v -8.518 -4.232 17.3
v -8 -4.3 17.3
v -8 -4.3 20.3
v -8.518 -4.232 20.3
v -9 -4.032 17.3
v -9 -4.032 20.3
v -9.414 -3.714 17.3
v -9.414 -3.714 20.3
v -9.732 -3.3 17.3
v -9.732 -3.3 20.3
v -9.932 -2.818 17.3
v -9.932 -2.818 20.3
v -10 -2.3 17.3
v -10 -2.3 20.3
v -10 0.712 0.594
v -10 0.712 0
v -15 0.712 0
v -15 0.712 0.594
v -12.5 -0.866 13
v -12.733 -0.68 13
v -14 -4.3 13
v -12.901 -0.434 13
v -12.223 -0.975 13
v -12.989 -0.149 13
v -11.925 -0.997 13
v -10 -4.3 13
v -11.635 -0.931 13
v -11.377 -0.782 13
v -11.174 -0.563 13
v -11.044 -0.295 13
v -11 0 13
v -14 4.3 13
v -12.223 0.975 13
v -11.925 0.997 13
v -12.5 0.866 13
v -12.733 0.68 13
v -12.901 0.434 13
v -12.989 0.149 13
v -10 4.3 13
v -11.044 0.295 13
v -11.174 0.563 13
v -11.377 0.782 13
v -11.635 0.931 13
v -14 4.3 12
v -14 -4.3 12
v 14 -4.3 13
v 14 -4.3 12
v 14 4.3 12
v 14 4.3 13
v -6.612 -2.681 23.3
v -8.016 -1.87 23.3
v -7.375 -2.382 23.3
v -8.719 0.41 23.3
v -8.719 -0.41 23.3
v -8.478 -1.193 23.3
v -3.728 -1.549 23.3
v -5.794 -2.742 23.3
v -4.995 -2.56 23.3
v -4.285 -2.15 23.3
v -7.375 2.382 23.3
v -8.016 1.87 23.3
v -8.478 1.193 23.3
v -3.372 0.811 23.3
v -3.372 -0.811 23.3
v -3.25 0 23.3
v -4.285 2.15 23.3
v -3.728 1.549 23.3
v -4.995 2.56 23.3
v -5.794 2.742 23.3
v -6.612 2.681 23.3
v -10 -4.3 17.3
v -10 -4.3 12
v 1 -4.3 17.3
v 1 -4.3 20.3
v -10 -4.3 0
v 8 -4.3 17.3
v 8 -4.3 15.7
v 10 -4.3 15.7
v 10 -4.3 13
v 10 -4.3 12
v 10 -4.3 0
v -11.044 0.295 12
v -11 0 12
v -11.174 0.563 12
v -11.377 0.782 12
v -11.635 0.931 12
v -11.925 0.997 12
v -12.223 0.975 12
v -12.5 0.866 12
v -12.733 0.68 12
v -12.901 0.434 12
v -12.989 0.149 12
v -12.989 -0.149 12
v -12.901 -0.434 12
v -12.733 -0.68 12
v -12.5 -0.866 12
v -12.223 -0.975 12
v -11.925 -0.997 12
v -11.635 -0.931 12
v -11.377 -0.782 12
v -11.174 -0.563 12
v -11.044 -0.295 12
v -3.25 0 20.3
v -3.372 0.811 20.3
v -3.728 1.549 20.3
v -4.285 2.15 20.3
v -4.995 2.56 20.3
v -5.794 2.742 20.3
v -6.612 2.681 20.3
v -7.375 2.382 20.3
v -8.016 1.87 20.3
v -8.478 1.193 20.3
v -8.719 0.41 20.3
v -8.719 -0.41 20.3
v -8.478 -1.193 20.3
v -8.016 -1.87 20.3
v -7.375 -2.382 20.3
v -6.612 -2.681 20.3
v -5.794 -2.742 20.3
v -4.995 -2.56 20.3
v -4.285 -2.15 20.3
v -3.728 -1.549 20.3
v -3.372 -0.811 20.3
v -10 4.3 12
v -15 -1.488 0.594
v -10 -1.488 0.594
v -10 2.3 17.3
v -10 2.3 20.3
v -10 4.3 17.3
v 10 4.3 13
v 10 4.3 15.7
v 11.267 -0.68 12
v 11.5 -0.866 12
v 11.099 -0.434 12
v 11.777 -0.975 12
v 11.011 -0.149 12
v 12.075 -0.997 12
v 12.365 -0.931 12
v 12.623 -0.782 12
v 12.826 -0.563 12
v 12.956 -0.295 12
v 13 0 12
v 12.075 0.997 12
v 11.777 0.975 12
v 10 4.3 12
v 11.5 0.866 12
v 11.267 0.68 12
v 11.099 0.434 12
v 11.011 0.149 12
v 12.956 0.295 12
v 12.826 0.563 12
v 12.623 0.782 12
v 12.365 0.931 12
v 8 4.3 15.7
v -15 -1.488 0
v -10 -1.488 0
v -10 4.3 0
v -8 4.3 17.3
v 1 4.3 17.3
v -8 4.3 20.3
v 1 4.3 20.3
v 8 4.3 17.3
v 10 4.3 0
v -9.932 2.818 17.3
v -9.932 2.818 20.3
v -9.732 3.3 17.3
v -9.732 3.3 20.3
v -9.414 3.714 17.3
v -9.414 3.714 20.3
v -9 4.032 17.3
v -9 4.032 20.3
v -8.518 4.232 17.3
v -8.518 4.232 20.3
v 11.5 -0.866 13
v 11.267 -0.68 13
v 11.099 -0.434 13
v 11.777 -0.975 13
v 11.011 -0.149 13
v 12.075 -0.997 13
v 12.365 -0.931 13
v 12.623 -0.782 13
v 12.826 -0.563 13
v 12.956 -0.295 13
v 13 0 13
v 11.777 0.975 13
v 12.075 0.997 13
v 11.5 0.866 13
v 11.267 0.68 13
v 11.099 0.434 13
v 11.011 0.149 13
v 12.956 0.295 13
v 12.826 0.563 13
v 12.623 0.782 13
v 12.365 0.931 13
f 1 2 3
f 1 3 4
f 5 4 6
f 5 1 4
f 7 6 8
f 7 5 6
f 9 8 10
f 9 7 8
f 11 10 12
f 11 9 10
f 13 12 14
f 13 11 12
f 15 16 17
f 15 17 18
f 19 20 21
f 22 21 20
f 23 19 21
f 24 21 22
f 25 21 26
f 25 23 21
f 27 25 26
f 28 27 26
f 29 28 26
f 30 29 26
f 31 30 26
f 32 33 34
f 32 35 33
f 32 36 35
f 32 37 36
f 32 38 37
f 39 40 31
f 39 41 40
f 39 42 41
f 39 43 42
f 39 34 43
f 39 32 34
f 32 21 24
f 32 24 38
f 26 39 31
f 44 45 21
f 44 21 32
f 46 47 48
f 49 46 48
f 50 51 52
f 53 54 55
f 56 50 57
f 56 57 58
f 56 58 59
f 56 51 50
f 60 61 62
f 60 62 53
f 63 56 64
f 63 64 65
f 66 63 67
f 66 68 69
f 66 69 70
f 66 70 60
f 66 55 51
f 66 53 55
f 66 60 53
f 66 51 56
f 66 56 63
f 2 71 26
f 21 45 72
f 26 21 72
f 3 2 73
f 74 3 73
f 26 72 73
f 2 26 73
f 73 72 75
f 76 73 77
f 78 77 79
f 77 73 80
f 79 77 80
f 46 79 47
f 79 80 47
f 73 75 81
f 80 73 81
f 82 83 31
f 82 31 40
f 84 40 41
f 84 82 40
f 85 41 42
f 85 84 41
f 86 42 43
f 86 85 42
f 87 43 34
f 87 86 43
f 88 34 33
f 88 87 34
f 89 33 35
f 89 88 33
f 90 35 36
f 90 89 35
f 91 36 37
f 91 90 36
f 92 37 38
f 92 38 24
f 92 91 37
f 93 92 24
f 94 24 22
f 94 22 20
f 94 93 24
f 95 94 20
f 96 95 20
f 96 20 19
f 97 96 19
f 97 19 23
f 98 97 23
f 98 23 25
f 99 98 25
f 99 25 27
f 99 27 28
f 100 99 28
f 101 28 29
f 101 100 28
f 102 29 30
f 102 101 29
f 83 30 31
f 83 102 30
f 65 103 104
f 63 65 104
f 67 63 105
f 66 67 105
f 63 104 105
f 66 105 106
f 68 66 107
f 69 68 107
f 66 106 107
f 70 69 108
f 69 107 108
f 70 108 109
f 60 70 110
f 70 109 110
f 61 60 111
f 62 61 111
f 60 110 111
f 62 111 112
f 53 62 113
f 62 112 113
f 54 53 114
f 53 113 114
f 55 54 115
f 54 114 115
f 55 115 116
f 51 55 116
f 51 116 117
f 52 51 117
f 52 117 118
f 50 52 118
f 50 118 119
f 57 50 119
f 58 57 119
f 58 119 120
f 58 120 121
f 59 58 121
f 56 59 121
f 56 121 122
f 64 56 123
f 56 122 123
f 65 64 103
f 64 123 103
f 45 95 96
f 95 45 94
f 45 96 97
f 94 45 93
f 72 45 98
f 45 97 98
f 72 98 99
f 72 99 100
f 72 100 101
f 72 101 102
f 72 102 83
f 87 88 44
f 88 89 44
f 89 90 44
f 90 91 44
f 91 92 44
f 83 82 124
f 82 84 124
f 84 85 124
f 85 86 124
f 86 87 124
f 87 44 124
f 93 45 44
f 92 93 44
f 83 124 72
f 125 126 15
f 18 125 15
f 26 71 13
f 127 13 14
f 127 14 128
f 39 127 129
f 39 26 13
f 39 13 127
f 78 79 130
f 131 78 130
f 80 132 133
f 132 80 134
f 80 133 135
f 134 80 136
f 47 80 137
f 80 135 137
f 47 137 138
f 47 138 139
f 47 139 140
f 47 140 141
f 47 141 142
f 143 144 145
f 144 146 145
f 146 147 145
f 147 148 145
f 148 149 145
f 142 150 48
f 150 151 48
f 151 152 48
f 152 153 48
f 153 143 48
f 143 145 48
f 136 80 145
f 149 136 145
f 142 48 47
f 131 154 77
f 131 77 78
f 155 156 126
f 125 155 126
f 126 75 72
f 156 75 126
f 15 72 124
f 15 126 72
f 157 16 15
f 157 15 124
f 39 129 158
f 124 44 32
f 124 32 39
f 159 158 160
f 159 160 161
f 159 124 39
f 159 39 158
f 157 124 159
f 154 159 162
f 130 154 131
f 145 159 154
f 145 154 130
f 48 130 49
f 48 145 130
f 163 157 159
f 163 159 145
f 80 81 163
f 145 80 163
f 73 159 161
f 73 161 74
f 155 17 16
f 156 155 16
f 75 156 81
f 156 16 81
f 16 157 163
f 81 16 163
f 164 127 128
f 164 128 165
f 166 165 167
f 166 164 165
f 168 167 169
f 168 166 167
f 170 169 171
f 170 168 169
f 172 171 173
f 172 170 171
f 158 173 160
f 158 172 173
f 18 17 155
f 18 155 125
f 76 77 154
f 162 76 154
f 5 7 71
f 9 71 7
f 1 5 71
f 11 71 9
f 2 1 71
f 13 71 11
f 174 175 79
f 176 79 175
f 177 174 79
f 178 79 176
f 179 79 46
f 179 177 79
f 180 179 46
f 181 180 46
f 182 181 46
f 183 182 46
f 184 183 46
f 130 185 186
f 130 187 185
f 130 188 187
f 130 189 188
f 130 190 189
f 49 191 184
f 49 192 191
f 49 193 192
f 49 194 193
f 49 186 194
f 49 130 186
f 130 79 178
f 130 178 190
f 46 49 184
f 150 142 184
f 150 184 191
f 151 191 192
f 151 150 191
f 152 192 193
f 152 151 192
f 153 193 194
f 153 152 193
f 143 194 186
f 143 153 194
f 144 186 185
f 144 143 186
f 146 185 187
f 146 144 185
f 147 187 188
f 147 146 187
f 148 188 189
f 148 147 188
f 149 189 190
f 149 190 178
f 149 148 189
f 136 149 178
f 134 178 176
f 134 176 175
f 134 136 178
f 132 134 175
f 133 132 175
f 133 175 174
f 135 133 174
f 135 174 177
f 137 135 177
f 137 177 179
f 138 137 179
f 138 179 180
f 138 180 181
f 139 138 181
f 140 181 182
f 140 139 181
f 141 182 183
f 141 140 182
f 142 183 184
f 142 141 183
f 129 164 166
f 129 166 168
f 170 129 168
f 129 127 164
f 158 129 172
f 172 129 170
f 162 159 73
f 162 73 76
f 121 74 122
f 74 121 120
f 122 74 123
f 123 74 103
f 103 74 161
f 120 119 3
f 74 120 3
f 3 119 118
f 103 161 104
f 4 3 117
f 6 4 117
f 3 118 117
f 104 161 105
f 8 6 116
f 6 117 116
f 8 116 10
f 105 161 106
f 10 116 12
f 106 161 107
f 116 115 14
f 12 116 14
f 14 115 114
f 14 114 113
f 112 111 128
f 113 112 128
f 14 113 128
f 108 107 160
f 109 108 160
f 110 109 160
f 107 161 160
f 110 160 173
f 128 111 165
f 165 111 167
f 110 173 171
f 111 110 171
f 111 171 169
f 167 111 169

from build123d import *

# Parameters (mm, degrees)
SKETCH2_W           = 20
SKETCH2_H           = 8.6
BOSS_EXTRUDE1_DEPTH = 12
SKETCH3_W           = 28
SKETCH3_H           = 8.6
SKETCH3_R           = 1
BOSS_EXTRUDE2_DEPTH = 1
SKETCH4_W           = 20
SKETCH4_H           = 8.6
BOSS_EXTRUDE3_DEPTH = 2.7
SKETCH5_W           = 18
SKETCH5_H           = 8.6
BOSS_EXTRUDE4_DEPTH = 1.6
BOSS_EXTRUDE5_DEPTH = 3
SKETCH7_R           = 2.75
BOSS_EXTRUDE6_DEPTH = 3
SKETCH8_W           = 0.593912785
SKETCH8_H           = 2.2
BOSS_EXTRUDE7_DEPTH = 5


with BuildPart() as part:
    # Sketch2 → Boss-Extrude1 (new body)
    with BuildSketch(Plane.XY):
        Rectangle(SKETCH2_W, SKETCH2_H)
    extrude(amount=BOSS_EXTRUDE1_DEPTH)

    # Sketch3 → Boss-Extrude2 (add)
    with BuildSketch(Plane.XY.offset(12)):
        Rectangle(SKETCH3_W, SKETCH3_H)
        with Locations((12, 0)):
            Circle(SKETCH3_R, mode=Mode.SUBTRACT)
        with Locations((-12, 0)):
            Circle(SKETCH3_R, mode=Mode.SUBTRACT)
    extrude(amount=BOSS_EXTRUDE2_DEPTH)

    # Sketch4 → Boss-Extrude3 (add)
    with BuildSketch(Plane.XY.offset(13)):
        Rectangle(SKETCH4_W, SKETCH4_H)
    extrude(amount=BOSS_EXTRUDE3_DEPTH)

    # Sketch5 → Boss-Extrude4 (add)
    with BuildSketch(Plane.XY.offset(15.7)):
        with Locations((-1, 0)):
            Rectangle(SKETCH5_W, SKETCH5_H)
    extrude(amount=BOSS_EXTRUDE4_DEPTH)

    # Sketch6 → Boss-Extrude5 (add)
    with BuildSketch(Plane.XY.offset(17.3)):
        with BuildLine():
            Line((-8, 4.3), (1, 4.3))
            Line((1, 4.3), (1, -4.3))
            Line((1, -4.3), (-8, -4.3))
            ThreePointArc((-8, -4.3), (-9.414213562, -3.714213562), (-10, -2.3))
            Line((-10, -2.3), (-10, 2.3))
            ThreePointArc((-10, 2.3), (-9.414213562, 3.714213562), (-8, 4.3))
        make_face()
    extrude(amount=BOSS_EXTRUDE5_DEPTH)

    # Sketch7 → Boss-Extrude6 (add)
    with BuildSketch(Plane.XY.offset(20.3)):
        with Locations((-6, 0)):
            Circle(SKETCH7_R)
    extrude(amount=BOSS_EXTRUDE6_DEPTH)

    # Sketch8 → Boss-Extrude7 (add)
    with BuildSketch(Plane.ZY.offset(10)):
        with Locations((0.296956392, -0.387828177)):
            Rectangle(SKETCH8_W, SKETCH8_H)
    extrude(amount=BOSS_EXTRUDE7_DEPTH)


solid = part.part
